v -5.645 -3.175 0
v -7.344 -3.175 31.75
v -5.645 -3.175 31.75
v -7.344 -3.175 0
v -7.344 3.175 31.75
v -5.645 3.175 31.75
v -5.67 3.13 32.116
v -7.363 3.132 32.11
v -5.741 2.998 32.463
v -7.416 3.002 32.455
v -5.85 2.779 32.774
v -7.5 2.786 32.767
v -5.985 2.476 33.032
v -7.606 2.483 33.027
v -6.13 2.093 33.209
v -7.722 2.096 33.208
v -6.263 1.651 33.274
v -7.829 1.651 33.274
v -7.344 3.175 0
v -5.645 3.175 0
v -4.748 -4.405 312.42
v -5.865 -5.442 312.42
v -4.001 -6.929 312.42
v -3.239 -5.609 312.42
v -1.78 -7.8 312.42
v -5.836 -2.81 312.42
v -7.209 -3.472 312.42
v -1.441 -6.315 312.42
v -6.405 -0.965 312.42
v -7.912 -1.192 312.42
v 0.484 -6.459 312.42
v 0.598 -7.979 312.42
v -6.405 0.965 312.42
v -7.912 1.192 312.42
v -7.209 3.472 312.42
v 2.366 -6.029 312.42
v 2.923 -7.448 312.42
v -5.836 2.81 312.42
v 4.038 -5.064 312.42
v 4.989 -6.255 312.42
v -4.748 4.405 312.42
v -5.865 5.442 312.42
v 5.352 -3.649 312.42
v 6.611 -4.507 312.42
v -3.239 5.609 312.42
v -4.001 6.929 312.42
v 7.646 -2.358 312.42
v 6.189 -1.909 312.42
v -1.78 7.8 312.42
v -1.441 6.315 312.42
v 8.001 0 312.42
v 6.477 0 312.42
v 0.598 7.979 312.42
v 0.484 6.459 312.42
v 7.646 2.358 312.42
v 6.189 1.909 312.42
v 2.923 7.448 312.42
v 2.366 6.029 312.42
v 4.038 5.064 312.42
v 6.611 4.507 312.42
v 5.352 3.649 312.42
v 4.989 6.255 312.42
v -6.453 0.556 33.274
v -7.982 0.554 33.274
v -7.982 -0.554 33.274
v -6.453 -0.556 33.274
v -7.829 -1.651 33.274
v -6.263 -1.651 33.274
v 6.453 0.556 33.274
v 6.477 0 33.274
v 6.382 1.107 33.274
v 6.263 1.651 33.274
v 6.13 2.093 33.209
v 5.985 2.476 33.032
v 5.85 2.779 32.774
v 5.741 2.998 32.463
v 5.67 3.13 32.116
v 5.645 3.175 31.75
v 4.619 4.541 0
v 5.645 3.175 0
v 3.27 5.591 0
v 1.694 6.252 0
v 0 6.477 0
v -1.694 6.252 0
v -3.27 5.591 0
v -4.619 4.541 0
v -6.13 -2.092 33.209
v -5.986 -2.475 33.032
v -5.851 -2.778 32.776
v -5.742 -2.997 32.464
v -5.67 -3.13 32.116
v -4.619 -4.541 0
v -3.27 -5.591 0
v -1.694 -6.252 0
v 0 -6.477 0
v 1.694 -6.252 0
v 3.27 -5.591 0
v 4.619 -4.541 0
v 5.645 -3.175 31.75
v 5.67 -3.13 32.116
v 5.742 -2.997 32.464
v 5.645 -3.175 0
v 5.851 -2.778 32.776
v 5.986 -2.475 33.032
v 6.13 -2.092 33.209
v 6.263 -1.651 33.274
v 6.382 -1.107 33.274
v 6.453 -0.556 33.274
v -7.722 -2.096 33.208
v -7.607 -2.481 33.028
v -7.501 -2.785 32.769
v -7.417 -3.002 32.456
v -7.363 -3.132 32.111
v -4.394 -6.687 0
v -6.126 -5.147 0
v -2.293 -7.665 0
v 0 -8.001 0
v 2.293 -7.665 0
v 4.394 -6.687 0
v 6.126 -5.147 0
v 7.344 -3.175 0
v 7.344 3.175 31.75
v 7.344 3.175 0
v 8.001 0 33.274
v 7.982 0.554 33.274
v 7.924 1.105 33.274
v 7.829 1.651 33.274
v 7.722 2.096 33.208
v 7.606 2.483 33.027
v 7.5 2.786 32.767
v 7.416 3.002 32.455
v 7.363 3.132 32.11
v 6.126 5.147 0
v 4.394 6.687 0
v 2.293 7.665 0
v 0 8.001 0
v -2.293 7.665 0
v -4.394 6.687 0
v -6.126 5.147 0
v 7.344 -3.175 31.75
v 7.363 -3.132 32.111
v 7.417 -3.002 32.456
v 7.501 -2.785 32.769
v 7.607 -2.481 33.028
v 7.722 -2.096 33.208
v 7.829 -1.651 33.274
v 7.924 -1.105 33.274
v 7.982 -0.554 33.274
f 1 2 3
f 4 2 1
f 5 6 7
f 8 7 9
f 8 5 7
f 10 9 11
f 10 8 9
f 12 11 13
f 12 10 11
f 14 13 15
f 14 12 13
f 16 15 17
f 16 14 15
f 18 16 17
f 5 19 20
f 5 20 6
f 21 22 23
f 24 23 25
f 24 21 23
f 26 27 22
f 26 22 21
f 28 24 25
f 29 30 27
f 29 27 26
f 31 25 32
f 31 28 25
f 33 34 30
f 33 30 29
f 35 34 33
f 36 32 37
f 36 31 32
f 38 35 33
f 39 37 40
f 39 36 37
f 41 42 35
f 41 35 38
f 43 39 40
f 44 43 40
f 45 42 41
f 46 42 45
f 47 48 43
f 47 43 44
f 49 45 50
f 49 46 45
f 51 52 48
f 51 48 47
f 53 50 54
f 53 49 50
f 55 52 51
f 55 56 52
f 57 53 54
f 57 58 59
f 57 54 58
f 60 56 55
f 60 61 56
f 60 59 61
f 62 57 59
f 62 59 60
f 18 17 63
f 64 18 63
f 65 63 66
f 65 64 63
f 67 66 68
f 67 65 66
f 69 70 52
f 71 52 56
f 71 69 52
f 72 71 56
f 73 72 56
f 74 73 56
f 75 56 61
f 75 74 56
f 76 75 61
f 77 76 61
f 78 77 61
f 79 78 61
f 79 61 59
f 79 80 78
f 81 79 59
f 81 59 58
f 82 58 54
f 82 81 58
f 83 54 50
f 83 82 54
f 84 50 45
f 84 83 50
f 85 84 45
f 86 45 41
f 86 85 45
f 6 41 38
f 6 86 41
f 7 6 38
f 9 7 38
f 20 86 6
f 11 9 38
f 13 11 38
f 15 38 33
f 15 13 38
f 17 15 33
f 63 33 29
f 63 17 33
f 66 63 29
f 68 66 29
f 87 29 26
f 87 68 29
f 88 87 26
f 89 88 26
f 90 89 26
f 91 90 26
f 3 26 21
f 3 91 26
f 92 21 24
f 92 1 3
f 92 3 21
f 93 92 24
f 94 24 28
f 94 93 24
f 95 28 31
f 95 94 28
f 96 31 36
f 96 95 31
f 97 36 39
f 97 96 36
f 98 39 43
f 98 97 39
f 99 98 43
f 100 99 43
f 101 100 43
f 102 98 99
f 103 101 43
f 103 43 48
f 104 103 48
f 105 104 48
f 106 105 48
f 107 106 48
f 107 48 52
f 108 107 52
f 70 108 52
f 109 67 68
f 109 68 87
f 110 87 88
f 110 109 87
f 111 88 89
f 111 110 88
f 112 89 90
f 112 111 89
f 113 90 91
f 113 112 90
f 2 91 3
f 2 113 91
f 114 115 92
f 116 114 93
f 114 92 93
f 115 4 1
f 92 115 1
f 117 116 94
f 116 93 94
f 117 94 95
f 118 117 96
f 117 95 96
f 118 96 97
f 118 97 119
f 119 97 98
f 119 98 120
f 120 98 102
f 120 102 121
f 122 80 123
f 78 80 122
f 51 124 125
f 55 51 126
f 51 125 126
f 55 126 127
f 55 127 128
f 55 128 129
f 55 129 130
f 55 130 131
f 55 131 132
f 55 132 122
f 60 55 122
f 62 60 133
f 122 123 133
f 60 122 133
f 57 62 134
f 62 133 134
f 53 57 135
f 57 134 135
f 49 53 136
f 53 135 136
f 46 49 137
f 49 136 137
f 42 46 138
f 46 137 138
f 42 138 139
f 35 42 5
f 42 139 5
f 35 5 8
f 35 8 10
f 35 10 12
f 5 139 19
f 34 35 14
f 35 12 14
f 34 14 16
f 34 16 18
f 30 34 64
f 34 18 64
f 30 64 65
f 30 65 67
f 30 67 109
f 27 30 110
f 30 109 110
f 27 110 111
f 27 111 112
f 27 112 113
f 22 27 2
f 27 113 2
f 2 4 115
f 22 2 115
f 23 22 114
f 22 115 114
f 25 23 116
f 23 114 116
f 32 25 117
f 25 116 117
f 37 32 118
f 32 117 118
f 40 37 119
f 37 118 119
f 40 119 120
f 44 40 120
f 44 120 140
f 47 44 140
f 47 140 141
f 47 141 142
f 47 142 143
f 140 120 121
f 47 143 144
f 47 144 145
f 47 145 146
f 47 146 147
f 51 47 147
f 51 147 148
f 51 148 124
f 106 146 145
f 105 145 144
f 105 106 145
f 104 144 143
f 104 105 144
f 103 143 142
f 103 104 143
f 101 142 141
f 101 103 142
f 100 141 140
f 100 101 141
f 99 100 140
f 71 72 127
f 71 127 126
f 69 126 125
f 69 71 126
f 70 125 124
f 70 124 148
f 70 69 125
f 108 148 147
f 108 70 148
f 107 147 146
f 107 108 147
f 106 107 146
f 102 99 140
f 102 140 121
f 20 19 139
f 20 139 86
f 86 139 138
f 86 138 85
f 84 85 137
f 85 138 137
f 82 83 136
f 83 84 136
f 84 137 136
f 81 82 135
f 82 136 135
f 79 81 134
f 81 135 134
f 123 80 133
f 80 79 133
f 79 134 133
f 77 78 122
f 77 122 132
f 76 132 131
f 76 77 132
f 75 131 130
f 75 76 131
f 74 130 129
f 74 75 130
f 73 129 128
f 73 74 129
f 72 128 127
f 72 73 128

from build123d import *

# Parameters (mm, degrees)
SKETCH1_R               = 8.001
SKETCH1_R_2             = 6.477
BOSS_EXTRUDE1_DEPTH     = 312.42
CUT_EXTRUDE2_DEPTH      = 313.624836509
CUT_EXTRUDE2_DEPTH_BACK = 313.624836509


with BuildPart() as part:
    # Sketch1 → Boss-Extrude1 (new body)
    with BuildSketch(Plane.XY):
        Circle(SKETCH1_R)
        Circle(SKETCH1_R_2, mode=Mode.SUBTRACT)
    extrude(amount=BOSS_EXTRUDE1_DEPTH)

    # Sketch2 → Cut-Extrude2 (cut, two sides: drawn at the far end of the back side and taken through both)
    with BuildSketch(Plane(origin=(0, 0, 0), x_dir=(0, 0, -1), z_dir=(1, 0, 0)).offset(-CUT_EXTRUDE2_DEPTH_BACK)):
        with BuildLine():
            Line((635.239664052, 3.175), (0, 3.175))
            Line((0, 3.175), (-31.75, 3.175))
            ThreePointArc((-31.75, 3.175), (-32.827630735, 2.728630735), (-33.274, 1.651))
            Line((-33.274, 1.651), (-33.274, -1.651))
            ThreePointArc((-33.274, -1.651), (-32.827630735, -2.728630735), (-31.75, -3.175))
            Line((-31.75, -3.175), (0, -3.175))
            Line((0, -3.175), (635.239664052, -3.175))
            Line((635.239664052, -3.175), (1905.718992156, -3.175))
            Line((1905.718992156, -3.175), (1905.718992156, 3.175))
            Line((1905.718992156, 3.175), (635.239664052, 3.175))
        make_face()
    extrude(amount=CUT_EXTRUDE2_DEPTH + CUT_EXTRUDE2_DEPTH_BACK, mode=Mode.SUBTRACT)


solid = part.part
